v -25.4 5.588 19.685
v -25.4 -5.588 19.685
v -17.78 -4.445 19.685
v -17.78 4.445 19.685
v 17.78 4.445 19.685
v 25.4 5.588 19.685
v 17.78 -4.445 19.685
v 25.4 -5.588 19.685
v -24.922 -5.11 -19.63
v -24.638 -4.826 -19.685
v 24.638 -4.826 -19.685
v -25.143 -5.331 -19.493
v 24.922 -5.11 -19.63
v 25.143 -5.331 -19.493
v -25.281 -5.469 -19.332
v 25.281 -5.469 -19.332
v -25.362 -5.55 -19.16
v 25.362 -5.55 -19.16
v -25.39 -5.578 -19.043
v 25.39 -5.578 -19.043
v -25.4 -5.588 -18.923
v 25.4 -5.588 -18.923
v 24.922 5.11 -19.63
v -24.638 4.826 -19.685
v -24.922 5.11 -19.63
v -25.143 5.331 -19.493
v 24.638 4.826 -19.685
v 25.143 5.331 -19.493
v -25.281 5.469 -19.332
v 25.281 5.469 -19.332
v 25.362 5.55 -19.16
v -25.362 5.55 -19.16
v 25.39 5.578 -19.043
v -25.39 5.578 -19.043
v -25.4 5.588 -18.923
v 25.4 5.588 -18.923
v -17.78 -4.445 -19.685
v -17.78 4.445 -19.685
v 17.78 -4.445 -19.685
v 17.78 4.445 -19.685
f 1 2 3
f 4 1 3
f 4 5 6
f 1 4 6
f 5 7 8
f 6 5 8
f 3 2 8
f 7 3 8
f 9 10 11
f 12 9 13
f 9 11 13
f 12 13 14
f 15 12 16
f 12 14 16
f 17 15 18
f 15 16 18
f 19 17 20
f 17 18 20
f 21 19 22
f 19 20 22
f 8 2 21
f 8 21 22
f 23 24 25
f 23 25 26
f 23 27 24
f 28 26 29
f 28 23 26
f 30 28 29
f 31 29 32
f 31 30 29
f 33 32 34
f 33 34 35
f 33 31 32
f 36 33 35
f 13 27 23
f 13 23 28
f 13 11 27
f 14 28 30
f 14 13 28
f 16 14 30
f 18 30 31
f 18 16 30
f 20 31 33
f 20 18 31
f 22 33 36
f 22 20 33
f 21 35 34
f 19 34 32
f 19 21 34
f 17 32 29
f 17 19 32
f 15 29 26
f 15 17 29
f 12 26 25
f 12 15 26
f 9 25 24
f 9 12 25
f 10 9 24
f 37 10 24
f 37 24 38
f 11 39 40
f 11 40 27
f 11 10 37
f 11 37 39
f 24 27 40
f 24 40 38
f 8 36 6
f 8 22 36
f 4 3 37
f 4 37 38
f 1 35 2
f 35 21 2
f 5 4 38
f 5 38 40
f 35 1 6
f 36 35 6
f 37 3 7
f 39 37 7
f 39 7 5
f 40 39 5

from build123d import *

# Parameters (mm, degrees)
F0_W     = 50.8
F0_H     = 39.37
F1_DEPTH = 5.588
F2_W     = 35.56
F2_H     = 8.89
F3_DEPTH = 39.37
F4_R     = 0.762


with BuildPart() as f1:
    # F0 (on Front) → F1 (new body, symmetric)
    with BuildSketch(Plane.XZ):
        Rectangle(F0_W, F0_H)
    extrude(amount=F1_DEPTH, both=True)

    # F2 (on face) → F3 (cut)
    with BuildSketch(Plane.XY.offset(19.685)):
        Rectangle(F2_W, F2_H)
    extrude(amount=-F3_DEPTH, mode=Mode.SUBTRACT)

    # F4
    f4_edges = [f1.edges().sort_by_distance(p)[0] for p in [
        (25.4, 0, -19.685),
        (0, -5.588, -19.685),
        (0, 5.588, -19.685),
        (-25.4, 0, -19.685),
    ]]
    fillet(f4_edges, radius=F4_R)


solid = f1.part
